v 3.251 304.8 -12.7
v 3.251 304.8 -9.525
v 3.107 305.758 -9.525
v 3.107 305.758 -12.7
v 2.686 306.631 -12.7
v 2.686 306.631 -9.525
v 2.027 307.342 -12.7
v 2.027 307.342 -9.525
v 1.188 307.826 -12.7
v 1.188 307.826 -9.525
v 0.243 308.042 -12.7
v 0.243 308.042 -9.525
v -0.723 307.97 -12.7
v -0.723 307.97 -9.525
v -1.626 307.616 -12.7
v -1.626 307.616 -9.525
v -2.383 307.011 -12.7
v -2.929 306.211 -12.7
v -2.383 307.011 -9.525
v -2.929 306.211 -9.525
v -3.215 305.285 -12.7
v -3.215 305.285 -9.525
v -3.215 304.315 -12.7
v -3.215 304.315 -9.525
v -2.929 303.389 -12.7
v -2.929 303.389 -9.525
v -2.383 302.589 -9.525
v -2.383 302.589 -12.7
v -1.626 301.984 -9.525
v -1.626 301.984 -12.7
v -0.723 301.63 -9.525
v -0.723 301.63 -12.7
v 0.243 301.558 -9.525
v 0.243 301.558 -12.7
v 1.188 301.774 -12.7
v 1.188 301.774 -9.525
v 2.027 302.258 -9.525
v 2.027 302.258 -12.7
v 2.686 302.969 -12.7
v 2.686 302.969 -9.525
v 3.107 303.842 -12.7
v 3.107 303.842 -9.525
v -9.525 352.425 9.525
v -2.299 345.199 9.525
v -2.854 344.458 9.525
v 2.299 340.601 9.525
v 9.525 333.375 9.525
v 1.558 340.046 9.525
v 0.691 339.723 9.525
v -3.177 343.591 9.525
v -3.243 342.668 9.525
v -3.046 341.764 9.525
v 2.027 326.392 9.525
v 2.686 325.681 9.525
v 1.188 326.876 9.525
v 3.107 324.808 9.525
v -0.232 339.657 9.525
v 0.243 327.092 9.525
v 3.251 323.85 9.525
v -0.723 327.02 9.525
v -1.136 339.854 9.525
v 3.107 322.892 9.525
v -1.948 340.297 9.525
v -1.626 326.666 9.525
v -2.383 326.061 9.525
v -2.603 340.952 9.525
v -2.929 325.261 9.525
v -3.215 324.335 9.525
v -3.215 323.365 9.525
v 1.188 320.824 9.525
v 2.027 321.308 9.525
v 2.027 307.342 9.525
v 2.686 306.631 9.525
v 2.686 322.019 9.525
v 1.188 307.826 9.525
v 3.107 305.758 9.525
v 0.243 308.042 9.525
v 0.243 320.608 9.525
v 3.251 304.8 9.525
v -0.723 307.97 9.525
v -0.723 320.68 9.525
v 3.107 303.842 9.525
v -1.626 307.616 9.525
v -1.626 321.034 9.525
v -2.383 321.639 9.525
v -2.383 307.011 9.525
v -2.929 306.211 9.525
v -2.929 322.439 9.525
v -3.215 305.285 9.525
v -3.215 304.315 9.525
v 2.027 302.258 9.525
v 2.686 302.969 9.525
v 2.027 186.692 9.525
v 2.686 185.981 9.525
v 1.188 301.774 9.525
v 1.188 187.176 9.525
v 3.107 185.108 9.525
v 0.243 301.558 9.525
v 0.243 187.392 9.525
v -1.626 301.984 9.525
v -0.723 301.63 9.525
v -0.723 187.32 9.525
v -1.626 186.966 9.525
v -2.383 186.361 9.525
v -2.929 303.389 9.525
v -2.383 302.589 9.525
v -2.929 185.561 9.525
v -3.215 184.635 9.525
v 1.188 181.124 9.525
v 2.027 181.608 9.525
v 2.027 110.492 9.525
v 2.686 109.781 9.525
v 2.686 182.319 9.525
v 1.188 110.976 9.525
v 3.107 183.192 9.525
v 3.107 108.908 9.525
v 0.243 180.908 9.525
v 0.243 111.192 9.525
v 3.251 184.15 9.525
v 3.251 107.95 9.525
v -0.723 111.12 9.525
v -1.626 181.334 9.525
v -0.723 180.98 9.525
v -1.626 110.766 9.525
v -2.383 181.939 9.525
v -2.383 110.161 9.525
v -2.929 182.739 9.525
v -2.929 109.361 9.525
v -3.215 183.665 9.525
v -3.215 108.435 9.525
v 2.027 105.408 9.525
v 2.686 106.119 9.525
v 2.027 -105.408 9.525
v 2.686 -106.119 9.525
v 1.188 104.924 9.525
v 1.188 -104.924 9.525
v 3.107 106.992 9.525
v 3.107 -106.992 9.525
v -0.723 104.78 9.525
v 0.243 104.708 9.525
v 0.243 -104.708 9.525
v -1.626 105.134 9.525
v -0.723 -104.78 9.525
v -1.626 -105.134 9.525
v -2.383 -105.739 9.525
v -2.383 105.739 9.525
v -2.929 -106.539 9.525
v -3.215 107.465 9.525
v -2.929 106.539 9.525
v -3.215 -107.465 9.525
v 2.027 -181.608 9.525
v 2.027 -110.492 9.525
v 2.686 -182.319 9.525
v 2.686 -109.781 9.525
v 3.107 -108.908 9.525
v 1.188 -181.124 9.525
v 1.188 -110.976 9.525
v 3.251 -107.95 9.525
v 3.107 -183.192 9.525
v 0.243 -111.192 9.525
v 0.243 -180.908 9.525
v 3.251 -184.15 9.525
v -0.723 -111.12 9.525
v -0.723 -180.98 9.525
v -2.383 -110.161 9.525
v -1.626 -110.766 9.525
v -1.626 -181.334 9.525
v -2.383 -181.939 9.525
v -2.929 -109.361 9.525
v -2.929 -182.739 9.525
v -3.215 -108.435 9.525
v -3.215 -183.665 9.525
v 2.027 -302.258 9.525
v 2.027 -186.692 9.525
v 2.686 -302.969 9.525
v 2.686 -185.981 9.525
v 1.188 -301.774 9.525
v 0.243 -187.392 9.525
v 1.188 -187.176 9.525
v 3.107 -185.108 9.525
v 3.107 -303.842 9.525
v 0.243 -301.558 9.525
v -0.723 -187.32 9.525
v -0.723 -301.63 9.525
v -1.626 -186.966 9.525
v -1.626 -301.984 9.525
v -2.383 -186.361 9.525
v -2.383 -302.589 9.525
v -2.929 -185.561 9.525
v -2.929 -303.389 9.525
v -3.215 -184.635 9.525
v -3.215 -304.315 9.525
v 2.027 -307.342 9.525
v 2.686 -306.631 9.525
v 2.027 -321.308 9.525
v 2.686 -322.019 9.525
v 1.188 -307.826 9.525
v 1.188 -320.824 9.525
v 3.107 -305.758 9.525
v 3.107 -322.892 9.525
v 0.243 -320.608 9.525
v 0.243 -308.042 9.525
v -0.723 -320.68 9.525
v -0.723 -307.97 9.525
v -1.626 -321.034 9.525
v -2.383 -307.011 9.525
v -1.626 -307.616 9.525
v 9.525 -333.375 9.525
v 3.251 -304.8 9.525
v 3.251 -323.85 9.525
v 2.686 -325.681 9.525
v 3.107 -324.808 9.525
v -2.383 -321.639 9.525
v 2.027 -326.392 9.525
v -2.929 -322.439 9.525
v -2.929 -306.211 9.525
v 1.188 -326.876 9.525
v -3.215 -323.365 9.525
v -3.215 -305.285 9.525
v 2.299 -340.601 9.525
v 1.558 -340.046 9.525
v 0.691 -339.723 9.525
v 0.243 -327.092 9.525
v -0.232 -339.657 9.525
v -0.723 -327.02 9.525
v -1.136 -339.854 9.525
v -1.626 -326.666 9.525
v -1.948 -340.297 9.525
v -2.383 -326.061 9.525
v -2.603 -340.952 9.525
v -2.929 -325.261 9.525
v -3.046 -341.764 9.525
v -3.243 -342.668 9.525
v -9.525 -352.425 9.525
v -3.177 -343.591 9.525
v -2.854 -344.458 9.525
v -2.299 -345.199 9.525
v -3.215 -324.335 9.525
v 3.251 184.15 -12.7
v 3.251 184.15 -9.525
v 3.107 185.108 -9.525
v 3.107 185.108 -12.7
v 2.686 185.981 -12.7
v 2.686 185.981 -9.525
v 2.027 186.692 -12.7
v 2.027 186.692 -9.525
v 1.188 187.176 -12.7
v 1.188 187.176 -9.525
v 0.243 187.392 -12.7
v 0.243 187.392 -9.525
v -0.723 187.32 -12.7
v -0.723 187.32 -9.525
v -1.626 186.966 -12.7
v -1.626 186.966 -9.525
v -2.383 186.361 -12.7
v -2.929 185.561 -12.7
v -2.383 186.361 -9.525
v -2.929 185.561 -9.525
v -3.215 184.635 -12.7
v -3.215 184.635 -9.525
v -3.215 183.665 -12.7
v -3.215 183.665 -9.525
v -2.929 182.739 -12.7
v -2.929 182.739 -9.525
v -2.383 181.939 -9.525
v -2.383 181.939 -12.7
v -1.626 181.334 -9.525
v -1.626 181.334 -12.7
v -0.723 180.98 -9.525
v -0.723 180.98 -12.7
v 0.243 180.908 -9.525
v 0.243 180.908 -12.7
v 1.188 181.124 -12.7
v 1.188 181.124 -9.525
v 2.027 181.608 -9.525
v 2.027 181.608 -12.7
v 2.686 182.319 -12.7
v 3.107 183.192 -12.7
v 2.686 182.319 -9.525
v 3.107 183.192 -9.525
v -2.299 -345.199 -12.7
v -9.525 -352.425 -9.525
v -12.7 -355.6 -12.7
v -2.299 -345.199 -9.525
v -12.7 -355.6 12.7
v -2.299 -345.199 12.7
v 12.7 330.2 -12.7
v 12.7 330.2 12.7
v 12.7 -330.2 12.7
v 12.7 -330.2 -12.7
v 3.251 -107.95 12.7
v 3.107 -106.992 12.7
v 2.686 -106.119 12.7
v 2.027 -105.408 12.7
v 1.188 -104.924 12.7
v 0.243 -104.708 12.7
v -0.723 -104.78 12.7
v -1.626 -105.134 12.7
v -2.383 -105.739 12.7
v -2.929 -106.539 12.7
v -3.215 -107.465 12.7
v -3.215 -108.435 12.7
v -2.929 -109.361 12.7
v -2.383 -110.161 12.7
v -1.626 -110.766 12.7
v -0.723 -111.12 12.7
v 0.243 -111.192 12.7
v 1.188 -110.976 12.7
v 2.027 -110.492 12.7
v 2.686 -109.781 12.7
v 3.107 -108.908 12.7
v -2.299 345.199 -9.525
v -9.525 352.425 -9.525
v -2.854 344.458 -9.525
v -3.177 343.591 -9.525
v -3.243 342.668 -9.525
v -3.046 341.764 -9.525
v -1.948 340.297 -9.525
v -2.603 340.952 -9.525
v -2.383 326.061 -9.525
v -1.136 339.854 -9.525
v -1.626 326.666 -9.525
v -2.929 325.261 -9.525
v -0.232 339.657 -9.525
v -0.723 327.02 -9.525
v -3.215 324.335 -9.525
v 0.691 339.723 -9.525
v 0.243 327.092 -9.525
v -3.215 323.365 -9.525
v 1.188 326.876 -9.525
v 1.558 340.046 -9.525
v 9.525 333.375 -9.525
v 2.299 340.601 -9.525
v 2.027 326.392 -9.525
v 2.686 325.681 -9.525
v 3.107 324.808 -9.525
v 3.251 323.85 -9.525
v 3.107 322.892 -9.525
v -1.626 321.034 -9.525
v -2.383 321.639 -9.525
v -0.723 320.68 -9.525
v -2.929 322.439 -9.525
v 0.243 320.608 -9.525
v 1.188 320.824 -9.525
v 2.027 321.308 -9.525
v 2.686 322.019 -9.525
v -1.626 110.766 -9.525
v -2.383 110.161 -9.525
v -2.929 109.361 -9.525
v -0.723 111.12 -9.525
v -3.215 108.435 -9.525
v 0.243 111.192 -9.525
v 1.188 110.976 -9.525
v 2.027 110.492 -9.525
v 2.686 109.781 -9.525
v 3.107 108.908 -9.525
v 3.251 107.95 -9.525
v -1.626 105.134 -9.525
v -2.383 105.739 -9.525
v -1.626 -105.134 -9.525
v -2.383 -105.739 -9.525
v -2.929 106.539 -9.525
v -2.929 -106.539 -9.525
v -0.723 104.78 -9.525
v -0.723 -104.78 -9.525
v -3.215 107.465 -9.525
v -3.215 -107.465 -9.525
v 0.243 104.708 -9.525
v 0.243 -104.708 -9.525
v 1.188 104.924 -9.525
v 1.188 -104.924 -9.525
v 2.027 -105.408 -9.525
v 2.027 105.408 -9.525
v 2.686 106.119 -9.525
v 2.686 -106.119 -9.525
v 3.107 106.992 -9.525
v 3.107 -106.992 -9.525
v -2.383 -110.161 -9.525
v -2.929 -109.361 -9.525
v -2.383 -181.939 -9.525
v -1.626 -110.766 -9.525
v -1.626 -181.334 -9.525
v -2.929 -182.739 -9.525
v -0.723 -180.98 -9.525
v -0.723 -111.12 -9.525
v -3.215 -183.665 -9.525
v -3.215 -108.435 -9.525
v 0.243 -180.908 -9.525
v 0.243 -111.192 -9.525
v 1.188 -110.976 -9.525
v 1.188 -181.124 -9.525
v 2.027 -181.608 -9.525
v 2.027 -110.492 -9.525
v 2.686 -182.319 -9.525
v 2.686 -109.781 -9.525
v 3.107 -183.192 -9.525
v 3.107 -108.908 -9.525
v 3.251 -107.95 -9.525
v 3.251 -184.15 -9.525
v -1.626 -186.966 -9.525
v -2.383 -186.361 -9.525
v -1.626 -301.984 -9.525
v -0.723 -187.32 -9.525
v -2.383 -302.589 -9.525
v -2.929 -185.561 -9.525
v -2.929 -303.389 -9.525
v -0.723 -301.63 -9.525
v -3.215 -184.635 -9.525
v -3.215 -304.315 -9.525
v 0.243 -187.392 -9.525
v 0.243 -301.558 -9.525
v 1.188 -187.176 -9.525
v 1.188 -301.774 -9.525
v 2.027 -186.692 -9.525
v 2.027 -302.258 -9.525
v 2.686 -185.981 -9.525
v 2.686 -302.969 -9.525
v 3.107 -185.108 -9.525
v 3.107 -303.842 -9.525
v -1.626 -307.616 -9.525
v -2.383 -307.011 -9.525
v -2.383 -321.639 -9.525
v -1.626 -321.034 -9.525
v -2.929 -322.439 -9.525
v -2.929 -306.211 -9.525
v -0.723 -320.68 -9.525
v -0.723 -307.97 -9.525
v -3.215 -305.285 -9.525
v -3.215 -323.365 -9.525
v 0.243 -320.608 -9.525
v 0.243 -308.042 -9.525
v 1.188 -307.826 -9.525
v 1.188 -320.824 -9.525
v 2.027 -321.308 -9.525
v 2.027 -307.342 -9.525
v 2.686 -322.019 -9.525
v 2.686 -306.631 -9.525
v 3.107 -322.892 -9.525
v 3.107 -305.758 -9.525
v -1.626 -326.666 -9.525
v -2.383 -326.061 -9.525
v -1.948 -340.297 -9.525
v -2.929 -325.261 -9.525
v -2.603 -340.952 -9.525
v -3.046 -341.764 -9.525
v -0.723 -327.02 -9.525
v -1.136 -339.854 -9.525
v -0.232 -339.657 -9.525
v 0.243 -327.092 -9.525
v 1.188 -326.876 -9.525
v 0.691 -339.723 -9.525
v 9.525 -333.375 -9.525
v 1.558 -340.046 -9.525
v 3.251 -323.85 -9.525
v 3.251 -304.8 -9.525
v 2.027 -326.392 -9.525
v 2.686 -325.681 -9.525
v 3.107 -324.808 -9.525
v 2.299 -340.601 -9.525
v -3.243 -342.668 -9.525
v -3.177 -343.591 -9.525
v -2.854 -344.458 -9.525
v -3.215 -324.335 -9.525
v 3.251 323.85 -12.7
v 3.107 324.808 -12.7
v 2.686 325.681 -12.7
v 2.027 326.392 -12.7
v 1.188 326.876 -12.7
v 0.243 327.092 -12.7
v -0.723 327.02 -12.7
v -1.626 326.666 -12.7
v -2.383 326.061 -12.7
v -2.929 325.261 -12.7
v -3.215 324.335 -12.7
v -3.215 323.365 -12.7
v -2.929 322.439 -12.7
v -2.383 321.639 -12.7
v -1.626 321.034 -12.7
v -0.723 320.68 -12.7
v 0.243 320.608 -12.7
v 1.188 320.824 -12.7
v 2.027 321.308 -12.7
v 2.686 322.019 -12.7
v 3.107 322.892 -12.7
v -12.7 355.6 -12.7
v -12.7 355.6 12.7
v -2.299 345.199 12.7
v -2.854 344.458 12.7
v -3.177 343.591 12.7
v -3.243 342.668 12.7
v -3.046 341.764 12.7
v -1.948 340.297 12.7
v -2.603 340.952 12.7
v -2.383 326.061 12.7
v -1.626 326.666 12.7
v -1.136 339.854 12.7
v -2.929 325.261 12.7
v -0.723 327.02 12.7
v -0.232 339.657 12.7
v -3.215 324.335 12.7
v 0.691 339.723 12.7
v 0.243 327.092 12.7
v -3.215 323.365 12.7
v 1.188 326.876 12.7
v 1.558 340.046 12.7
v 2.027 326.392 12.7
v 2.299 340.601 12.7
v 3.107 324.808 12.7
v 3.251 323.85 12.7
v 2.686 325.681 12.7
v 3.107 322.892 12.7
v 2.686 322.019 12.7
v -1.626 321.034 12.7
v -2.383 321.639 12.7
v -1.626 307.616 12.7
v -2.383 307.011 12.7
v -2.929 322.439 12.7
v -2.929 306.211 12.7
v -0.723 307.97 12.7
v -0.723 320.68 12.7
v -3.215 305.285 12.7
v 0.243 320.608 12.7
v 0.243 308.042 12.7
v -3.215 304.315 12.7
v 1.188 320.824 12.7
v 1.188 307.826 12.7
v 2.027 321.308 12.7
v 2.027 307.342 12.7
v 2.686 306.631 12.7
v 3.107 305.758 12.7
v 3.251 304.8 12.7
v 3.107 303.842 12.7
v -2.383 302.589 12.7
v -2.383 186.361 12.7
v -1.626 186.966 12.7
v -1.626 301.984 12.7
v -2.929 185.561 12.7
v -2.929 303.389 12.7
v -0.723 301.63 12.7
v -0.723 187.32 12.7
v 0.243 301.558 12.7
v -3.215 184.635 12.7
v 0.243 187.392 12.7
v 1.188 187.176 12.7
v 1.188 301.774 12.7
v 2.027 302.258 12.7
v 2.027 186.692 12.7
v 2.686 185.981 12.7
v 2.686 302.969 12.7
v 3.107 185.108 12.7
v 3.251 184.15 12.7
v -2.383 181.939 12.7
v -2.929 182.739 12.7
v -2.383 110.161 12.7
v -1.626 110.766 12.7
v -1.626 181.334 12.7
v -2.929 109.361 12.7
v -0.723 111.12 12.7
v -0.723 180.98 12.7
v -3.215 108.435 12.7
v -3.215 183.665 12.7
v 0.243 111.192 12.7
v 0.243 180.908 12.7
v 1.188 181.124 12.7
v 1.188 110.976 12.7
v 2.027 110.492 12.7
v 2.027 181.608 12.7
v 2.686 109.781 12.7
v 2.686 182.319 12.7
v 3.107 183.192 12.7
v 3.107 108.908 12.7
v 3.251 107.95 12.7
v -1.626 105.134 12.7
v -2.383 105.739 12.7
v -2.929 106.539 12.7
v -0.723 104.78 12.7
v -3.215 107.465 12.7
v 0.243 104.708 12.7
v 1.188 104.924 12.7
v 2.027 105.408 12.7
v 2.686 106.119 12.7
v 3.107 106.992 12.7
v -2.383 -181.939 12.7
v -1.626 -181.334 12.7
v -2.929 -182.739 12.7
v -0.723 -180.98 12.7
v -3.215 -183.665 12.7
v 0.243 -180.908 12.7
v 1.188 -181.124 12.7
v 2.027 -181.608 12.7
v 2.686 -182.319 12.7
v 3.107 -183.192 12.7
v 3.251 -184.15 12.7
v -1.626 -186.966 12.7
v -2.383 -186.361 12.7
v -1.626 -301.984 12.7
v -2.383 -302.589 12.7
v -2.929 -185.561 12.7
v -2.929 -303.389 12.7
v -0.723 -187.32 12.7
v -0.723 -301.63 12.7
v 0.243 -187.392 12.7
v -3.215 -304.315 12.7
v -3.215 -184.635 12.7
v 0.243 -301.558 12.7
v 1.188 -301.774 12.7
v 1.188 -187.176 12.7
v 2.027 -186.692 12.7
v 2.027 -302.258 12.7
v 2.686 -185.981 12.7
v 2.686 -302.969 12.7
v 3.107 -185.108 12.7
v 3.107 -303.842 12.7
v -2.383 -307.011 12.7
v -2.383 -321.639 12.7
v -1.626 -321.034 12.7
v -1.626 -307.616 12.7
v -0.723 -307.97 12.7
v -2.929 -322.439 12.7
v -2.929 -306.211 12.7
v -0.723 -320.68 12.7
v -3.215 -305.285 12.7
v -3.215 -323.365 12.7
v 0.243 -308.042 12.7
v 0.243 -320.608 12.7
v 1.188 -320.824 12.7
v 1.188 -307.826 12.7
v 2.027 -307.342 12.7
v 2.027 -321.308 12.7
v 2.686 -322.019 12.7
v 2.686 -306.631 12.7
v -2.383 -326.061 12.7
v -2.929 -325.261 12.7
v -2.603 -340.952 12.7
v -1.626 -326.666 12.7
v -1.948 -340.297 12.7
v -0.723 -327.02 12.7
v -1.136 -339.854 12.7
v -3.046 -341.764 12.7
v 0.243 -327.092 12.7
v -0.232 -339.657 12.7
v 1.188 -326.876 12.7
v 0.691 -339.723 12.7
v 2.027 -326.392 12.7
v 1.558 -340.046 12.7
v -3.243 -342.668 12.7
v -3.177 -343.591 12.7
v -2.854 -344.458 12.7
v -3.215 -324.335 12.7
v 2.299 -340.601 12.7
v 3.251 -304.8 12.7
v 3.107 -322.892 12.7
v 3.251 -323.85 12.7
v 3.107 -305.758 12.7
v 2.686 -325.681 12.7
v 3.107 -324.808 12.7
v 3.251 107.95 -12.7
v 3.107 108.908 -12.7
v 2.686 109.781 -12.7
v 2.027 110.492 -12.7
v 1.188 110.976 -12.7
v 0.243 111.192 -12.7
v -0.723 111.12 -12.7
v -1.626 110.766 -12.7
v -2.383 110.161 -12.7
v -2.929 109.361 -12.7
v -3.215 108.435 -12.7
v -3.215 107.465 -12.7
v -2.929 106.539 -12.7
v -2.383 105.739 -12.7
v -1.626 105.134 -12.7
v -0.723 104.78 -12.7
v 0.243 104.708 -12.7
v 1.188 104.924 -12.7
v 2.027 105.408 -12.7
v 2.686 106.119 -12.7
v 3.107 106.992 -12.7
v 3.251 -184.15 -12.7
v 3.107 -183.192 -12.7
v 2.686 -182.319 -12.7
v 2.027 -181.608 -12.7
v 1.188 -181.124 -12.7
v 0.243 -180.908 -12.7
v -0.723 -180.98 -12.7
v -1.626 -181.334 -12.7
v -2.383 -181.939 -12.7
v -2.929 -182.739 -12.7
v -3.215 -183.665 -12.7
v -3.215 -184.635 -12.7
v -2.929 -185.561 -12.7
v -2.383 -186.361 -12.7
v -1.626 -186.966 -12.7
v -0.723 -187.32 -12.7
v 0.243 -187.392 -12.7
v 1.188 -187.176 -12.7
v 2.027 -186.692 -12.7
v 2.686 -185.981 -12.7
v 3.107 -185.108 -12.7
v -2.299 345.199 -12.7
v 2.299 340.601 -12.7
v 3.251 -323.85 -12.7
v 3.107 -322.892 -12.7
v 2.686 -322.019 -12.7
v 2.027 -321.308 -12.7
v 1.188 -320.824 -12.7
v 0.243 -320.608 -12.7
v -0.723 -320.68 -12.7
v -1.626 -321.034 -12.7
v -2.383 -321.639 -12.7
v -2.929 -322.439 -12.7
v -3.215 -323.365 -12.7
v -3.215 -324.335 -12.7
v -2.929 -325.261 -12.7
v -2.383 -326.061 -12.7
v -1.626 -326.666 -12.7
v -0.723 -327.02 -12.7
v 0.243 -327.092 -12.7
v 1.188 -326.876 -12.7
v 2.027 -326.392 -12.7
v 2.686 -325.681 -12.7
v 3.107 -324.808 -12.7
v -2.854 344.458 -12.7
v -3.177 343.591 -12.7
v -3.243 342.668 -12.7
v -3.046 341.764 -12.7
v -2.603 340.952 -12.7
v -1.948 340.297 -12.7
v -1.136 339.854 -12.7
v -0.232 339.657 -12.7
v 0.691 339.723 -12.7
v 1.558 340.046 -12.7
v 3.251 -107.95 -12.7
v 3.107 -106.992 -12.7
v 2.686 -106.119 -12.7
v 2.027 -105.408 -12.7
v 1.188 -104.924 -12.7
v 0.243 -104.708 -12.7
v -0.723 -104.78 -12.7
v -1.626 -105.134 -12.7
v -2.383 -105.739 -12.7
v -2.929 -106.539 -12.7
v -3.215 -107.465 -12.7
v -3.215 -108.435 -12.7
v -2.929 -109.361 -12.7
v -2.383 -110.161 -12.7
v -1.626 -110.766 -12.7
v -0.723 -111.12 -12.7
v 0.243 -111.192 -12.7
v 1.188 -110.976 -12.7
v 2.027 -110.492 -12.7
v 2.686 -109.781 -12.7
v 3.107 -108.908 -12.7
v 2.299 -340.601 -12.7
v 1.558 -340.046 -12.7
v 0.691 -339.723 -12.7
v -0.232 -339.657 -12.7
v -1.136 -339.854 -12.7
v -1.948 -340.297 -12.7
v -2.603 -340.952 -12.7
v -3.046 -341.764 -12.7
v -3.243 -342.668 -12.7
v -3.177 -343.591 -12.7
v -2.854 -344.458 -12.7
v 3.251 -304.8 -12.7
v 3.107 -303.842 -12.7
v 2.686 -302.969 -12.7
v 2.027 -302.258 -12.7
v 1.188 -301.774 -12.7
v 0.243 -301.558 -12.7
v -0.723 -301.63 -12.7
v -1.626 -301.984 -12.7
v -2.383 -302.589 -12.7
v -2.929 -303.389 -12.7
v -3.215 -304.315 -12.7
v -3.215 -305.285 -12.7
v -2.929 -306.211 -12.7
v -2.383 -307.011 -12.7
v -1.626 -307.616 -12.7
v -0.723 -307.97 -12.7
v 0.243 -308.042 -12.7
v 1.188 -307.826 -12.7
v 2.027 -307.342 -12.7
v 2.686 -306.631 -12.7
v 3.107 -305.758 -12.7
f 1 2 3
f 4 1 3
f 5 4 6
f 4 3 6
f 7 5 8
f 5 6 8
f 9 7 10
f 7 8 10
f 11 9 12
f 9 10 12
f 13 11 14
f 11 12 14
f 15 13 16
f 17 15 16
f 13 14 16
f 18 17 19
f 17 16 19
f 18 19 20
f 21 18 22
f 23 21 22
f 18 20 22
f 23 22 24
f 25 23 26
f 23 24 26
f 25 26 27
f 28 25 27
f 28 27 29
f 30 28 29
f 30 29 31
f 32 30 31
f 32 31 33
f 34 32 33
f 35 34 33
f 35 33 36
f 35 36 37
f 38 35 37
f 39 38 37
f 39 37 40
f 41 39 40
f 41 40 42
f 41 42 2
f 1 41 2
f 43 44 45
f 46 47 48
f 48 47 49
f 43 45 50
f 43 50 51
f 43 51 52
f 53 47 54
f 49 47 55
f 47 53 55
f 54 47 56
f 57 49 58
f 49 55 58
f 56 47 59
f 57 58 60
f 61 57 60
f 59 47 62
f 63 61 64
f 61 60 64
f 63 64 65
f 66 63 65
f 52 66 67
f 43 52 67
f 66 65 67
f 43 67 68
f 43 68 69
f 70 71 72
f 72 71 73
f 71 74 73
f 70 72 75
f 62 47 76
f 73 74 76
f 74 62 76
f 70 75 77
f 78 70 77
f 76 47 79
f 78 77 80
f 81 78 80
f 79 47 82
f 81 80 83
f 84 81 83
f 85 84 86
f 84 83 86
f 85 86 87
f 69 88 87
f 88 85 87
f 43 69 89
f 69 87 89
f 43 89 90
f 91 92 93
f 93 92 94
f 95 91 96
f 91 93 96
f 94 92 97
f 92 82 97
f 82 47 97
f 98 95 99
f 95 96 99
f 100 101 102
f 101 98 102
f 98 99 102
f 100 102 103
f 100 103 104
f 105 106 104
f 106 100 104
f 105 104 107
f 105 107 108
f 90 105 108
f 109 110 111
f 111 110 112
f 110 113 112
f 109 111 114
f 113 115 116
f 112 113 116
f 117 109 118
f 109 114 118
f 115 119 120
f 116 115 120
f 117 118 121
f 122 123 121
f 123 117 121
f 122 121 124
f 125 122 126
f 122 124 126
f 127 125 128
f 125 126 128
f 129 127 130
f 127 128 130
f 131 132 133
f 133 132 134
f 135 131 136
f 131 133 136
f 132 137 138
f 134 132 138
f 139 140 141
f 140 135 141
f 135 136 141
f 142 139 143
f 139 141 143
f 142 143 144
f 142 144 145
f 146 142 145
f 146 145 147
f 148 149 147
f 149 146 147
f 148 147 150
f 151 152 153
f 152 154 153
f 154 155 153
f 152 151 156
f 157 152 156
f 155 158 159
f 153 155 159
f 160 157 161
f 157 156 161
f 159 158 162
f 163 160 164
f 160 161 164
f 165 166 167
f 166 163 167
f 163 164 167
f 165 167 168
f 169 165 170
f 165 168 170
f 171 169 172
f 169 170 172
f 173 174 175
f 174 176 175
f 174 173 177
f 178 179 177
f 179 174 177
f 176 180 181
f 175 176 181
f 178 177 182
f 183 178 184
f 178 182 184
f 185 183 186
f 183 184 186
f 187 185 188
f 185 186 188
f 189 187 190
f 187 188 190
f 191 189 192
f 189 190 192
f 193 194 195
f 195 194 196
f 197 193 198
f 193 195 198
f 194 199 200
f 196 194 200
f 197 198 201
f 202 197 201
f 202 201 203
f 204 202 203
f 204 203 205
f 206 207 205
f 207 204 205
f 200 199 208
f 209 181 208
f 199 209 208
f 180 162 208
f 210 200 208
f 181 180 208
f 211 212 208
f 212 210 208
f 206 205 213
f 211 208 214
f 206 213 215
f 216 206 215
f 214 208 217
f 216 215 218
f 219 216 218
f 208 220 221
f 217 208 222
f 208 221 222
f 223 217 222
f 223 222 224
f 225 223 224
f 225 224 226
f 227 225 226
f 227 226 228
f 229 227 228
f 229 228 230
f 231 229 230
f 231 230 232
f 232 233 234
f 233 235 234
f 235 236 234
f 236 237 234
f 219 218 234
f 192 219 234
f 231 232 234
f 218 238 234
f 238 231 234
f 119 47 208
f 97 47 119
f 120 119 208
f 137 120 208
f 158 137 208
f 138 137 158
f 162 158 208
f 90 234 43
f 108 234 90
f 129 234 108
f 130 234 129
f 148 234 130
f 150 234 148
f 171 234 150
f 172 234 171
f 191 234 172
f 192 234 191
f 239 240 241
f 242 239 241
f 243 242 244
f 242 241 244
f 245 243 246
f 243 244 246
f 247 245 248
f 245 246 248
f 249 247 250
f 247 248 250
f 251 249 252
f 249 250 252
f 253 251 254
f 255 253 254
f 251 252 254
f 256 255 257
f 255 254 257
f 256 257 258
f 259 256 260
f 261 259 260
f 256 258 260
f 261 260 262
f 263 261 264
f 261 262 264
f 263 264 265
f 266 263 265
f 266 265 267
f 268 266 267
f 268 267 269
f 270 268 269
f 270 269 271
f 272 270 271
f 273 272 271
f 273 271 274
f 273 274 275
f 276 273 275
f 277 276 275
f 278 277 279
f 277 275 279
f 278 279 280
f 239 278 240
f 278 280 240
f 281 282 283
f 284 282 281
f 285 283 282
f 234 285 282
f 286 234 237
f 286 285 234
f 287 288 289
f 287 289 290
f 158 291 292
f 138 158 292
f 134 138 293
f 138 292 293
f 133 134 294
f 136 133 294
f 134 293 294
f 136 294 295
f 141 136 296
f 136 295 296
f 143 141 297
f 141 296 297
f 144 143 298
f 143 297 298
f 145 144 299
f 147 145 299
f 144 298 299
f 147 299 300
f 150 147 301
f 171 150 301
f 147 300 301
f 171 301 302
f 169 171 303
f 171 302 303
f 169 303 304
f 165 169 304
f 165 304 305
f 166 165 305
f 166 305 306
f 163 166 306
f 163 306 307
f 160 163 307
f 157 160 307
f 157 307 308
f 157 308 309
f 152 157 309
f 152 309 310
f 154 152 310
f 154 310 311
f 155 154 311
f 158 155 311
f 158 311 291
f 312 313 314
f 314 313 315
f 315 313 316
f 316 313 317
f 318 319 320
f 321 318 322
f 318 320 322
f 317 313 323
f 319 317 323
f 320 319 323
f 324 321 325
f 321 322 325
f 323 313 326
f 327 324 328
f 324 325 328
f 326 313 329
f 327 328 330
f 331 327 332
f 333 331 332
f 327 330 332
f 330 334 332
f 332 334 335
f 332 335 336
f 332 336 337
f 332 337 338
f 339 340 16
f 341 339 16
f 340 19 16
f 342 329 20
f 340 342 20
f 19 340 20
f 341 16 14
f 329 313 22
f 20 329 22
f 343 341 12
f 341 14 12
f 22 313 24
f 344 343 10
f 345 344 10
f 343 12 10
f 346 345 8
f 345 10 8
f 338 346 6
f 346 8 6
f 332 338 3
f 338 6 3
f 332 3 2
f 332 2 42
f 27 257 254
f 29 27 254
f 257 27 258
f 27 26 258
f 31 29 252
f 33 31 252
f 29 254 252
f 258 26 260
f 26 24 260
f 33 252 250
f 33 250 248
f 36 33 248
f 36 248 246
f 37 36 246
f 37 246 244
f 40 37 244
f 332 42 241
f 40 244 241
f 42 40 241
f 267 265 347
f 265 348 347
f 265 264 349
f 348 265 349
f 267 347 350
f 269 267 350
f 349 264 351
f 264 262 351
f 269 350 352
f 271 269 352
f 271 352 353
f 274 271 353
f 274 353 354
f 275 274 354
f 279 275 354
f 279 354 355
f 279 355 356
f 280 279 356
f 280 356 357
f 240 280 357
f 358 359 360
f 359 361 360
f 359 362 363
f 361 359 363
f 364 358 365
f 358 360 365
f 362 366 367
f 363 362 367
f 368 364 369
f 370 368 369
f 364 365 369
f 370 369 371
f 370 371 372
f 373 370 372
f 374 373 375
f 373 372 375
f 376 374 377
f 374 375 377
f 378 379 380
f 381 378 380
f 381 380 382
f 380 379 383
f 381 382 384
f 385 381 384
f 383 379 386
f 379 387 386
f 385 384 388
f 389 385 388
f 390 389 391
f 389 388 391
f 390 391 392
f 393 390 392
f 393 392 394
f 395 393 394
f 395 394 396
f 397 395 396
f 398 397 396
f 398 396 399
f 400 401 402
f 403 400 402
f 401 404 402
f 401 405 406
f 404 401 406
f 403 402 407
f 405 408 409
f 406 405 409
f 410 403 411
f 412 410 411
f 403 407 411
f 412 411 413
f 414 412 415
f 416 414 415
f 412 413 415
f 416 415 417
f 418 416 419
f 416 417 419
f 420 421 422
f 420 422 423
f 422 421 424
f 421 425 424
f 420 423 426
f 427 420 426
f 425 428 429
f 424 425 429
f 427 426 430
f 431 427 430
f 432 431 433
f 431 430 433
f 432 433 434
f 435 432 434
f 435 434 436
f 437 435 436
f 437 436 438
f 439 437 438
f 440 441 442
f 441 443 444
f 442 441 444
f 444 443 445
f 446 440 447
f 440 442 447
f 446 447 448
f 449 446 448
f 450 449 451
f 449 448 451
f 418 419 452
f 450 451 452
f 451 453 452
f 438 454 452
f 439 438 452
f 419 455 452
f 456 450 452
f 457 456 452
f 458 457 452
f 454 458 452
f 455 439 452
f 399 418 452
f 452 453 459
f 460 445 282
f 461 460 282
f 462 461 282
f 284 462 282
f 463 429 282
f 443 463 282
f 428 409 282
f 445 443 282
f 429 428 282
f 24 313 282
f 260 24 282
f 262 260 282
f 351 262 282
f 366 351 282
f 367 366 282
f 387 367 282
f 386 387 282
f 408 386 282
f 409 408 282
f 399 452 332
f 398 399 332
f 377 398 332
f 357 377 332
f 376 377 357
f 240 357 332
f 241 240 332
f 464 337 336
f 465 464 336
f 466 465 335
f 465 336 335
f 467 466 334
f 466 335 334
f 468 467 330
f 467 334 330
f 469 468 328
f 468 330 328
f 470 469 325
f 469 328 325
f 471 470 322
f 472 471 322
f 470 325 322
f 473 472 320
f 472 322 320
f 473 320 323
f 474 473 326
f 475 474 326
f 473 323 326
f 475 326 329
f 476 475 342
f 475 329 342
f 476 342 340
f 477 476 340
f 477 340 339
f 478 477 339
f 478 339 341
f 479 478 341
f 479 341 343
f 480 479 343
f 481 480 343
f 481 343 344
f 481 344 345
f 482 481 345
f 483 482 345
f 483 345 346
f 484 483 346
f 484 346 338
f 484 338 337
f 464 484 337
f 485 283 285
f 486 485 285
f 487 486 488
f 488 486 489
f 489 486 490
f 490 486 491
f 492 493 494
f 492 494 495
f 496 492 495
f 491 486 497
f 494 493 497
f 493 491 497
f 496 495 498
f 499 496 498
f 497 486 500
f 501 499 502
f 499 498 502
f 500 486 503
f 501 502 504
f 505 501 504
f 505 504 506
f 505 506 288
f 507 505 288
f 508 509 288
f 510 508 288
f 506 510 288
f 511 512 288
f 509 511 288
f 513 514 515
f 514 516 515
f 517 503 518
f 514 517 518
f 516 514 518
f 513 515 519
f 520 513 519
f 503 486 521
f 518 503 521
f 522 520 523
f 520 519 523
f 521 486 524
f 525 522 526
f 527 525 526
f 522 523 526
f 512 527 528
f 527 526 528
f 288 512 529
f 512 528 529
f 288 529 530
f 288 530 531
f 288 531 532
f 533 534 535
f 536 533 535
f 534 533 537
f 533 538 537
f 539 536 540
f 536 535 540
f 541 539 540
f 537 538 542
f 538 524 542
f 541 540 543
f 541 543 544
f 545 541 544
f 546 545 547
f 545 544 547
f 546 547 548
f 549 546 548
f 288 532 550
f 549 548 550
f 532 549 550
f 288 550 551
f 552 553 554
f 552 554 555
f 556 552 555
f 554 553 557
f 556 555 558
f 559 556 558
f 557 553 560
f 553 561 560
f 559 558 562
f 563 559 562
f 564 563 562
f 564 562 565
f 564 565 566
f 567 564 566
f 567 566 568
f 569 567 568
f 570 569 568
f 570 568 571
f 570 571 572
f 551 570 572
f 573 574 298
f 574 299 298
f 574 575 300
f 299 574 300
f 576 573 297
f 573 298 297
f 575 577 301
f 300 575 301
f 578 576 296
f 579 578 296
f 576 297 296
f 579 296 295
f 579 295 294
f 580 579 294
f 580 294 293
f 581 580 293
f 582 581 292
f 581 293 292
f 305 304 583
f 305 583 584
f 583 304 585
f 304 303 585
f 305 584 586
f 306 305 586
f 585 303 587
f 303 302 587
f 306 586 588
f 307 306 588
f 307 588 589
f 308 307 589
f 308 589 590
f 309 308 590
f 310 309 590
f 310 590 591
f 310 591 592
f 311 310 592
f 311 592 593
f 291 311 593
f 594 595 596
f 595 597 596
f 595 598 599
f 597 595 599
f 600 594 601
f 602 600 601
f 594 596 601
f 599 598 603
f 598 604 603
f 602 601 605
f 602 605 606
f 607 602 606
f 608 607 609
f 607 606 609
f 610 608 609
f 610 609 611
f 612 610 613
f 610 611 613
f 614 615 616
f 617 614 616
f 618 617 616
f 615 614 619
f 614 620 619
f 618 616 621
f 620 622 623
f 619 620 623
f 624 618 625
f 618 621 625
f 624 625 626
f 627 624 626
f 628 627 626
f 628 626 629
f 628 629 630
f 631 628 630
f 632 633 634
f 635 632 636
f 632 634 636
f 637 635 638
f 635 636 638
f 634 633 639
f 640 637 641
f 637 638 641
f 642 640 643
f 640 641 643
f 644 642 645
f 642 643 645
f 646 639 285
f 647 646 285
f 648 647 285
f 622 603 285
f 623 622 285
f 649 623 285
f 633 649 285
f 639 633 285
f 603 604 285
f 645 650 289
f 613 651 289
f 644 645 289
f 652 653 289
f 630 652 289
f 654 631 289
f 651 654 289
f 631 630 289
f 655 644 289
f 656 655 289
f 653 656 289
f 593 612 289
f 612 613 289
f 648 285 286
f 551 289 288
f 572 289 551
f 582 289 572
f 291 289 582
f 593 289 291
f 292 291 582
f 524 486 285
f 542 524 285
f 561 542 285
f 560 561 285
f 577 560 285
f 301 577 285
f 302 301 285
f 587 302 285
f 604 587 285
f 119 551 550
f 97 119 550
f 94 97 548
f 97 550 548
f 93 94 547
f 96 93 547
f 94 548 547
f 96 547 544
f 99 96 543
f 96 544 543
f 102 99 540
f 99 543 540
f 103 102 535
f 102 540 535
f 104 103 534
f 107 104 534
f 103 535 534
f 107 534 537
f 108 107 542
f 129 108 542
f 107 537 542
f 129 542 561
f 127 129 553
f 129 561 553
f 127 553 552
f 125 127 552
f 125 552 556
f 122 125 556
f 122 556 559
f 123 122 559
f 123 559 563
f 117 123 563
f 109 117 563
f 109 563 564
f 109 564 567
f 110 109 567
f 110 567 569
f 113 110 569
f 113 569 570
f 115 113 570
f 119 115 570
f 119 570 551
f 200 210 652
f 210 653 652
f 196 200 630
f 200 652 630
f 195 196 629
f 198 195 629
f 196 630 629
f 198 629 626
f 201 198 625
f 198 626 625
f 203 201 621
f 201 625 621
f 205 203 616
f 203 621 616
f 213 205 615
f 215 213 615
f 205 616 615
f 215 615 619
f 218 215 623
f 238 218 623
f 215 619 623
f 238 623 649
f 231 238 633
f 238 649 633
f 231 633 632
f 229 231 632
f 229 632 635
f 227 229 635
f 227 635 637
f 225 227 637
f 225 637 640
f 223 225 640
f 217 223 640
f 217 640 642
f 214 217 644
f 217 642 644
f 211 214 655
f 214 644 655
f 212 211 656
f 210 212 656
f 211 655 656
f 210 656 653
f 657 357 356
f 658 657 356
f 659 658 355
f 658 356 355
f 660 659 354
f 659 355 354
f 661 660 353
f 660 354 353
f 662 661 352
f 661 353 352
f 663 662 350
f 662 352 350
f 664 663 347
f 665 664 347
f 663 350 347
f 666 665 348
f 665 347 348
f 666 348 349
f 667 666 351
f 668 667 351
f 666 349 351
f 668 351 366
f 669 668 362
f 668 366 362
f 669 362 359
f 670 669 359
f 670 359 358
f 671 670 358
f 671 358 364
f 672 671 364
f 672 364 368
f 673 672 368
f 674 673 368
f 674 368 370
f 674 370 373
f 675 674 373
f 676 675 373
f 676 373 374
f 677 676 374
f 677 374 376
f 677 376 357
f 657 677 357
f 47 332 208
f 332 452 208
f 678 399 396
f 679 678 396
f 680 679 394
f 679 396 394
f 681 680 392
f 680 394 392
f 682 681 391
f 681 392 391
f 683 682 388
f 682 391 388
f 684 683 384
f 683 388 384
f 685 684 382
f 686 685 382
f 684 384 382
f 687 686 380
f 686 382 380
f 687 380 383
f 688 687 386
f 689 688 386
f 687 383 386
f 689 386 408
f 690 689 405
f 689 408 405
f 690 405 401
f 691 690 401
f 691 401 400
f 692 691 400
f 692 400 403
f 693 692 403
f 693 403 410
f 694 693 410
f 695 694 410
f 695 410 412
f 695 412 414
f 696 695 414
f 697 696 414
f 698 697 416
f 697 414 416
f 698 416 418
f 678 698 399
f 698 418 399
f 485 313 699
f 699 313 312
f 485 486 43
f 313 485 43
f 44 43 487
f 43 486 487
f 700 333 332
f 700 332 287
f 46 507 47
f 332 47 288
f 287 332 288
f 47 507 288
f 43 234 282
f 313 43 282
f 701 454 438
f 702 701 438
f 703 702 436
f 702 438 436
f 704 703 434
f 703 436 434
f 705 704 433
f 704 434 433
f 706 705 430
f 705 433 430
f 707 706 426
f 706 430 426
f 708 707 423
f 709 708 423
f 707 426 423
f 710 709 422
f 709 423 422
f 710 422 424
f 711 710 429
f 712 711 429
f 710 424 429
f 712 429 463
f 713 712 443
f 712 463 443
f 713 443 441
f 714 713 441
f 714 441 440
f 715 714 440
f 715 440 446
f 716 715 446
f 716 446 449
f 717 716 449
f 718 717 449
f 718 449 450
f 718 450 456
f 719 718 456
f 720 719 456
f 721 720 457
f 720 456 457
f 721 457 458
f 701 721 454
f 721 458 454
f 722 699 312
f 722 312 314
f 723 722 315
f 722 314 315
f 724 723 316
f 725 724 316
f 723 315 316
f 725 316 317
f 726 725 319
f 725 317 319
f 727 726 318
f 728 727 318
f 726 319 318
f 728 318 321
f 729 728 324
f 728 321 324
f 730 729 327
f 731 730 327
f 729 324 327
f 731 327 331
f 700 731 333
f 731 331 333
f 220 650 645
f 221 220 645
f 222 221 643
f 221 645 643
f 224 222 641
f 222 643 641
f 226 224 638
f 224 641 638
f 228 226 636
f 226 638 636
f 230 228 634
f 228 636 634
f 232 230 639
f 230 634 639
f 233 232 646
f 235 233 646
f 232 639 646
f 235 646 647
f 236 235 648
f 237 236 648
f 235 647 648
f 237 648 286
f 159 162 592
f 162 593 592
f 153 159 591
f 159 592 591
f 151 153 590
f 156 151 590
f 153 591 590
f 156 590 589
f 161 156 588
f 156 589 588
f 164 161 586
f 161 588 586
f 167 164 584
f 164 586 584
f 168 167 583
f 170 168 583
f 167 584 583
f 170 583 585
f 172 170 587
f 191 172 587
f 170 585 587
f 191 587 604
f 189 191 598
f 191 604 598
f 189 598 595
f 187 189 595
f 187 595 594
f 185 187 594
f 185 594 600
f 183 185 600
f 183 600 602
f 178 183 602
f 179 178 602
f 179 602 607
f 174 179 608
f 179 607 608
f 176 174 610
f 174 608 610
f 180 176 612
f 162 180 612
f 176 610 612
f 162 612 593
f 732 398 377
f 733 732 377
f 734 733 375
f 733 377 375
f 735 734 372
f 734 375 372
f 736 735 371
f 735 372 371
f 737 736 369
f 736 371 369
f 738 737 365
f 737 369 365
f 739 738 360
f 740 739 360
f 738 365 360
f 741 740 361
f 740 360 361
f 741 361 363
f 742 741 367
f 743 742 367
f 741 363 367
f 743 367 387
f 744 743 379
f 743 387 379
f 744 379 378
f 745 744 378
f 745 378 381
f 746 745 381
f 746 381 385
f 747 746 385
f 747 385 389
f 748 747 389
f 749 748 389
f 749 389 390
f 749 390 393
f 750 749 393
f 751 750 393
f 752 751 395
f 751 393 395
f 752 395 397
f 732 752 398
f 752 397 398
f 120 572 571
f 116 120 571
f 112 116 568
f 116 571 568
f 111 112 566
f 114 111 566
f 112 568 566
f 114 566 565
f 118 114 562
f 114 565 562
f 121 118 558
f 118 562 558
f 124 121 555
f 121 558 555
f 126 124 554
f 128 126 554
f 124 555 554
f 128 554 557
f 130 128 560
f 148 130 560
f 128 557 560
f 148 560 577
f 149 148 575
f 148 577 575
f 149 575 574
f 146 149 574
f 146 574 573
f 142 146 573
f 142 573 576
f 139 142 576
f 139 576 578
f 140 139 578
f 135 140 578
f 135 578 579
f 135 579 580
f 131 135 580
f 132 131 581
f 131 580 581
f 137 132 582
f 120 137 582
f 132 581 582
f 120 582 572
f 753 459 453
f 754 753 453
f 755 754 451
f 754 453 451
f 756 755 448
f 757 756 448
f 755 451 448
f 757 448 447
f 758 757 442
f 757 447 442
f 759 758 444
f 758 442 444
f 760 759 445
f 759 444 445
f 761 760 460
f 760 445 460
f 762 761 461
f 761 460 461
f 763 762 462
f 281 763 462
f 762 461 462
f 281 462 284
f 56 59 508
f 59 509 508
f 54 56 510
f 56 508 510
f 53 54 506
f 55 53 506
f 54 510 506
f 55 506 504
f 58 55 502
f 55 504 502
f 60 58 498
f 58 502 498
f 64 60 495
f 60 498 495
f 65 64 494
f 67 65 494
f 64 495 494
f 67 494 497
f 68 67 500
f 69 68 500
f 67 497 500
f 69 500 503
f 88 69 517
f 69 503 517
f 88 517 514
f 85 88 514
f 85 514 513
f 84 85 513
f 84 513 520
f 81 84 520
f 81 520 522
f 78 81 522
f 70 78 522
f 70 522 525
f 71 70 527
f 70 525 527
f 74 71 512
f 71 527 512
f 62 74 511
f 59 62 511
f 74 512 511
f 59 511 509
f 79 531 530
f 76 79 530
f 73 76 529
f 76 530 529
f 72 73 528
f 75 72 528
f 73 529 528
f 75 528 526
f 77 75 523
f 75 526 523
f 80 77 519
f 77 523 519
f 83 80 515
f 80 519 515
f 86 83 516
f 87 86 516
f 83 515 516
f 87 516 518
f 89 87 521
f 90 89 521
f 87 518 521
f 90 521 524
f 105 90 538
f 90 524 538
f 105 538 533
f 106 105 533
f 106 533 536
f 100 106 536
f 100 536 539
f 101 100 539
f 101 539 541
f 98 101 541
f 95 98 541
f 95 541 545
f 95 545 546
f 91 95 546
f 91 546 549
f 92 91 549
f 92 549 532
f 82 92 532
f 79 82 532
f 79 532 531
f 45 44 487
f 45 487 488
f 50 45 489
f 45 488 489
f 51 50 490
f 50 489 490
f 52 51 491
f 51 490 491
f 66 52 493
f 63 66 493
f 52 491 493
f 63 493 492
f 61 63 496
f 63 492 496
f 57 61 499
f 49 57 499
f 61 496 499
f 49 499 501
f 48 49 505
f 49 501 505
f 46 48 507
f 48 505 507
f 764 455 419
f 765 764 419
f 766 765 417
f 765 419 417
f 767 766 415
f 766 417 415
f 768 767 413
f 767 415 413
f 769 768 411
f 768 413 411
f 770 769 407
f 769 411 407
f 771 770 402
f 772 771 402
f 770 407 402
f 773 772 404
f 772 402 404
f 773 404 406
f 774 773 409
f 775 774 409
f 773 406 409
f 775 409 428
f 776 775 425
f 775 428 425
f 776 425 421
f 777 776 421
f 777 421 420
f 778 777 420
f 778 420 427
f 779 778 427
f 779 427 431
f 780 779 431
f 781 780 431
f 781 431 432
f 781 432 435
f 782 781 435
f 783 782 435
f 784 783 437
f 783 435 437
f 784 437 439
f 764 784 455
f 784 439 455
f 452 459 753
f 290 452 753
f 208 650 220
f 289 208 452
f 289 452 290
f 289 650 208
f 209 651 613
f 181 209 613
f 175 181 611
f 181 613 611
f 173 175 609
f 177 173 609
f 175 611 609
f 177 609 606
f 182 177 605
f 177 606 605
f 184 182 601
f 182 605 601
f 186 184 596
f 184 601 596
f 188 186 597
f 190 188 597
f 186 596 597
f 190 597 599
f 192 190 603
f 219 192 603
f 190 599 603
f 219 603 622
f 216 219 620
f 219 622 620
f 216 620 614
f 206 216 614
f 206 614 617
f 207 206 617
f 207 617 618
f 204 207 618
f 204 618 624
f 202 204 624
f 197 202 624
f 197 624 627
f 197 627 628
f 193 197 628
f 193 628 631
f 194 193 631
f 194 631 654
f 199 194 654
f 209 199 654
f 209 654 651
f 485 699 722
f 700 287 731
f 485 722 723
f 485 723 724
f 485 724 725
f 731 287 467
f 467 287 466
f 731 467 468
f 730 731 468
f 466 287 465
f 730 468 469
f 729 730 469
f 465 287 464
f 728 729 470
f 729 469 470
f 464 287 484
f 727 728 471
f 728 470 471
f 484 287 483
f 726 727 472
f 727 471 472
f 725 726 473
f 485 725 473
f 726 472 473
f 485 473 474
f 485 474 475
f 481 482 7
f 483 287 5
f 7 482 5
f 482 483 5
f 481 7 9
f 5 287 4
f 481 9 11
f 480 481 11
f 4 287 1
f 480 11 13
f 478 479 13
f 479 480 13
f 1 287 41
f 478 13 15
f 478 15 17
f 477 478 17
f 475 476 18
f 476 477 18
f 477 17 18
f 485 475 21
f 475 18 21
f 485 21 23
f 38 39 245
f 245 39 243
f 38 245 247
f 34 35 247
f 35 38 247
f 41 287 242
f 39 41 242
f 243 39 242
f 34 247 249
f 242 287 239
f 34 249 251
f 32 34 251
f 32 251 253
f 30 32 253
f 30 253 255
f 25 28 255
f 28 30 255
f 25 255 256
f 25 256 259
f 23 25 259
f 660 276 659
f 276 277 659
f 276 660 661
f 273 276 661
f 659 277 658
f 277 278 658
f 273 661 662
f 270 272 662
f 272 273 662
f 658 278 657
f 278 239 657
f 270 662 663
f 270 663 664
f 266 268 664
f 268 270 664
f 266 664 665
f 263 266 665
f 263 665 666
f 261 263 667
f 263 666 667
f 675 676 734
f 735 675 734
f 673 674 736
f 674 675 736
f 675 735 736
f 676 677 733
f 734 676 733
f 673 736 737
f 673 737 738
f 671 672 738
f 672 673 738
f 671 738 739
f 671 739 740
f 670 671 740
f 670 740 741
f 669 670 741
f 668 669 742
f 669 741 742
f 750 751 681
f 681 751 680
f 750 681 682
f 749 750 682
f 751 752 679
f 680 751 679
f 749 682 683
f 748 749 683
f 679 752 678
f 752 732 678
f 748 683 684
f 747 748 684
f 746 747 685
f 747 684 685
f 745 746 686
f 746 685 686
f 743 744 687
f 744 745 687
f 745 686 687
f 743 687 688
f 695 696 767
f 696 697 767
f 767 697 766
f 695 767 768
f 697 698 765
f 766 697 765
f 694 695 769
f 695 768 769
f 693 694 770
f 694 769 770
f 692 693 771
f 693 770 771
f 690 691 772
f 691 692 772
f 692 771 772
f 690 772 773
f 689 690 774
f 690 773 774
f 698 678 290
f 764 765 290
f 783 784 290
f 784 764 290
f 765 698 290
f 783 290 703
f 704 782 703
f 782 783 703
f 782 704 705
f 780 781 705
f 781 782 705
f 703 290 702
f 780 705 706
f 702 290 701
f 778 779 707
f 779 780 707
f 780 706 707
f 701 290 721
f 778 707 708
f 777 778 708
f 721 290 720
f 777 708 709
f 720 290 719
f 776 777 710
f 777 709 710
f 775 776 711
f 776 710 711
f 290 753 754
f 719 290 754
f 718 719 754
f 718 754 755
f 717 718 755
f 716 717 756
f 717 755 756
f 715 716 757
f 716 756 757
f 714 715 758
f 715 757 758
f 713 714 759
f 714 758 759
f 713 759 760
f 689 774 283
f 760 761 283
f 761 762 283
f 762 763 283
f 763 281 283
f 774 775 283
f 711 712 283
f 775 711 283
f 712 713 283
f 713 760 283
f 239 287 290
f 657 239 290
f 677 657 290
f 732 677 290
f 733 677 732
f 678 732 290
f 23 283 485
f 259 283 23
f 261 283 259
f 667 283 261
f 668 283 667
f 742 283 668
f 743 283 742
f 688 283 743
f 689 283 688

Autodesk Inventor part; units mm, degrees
ref_plane "YZ Plane" through (0, 0, 0) normal (1, 0, 0) x (0, 1, 0)
ref_plane "XZ Plane" through (0, 0, 0) normal (0, 1, 0) x (-1, 0, 0)
ref_plane "XY Plane" through (0, 0, 0) normal (0, 0, 1) x (1, 0, 0)
sketch "Sketch1" plane through (0, 0, 0) normal (0, 1, 0) x (-1, 0, 0)
  line L0 (-12.7, -12.7) -> (12.7, -12.7)
  line L1 (12.7, -12.7) -> (12.7, 12.7)
  line L2 (12.7, 12.7) -> (-12.7, 12.7)
  line L3 (-12.7, 12.7) -> (-12.7, -12.7)
  line L4 (-12.7, -12.7) -> (12.7, 12.7) construction
  line L5 (12.7, -12.7) -> (-12.7, 12.7) construction
  line L6 (9.525, 9.525) -> (9.525, -9.525)
  line L7 (9.525, -9.525) -> (-9.525, -9.525)
  line L8 (-9.525, -9.525) -> (-9.525, 9.525)
  line L9 (-9.525, 9.525) -> (9.525, 9.525)
  point P0 (0, 0)
  dimension "d0" = 25.4
  dimension "d1" = 25.4
  dimension "d2" = 3.175
extrude "Extrusion1" add sketch "Sketch1" along normal mid plane 711.2
sketch "Sketch2" plane through (-12.7, 355.6, 12.7) normal (0, 0, 1) x (1, 0, 0)
  line L0 (0, 0) -> (25.4, 0) projected
  line L1 (0, 0) -> (25.4, -25.4)
  line L2 (25.4, -711.2) -> (25.4, 0) projected
  circle A0 centre (12.7, -31.75) radius 3.2512
  circle A1 centre (12.7, -50.8) radius 3.2512
  line L3 (0, -711.2) -> (0, 0) projected
  line L4 (0, -355.6) -> (25.4, -355.6) construction
  line L5 (0, -711.2) -> (25.4, -711.2)
  line L6 (0, -711.2) -> (25.4, -685.8)
  circle A2 centre (12.7, -679.45) radius 3.2512
  circle A3 centre (12.7, -660.4) radius 3.2512
  circle A4 centre (12.7, -12.7) radius 3.2512
  circle A5 centre (12.7, -698.5) radius 3.2512
  point P0 (12.7, -355.6)
  point P1 (12.7, 0)
  point P2 (12.7, -711.2)
  point P3 (14.9989, -14.9989)
  point P4 (10.4011, -10.4011)
  point P5 (14.9989, -696.2011)
  point P6 (10.4011, -700.7989)
  dimension "d5" = 25.4
  dimension "d6" = 6.5024
  dimension "d7" = 31.75
  dimension "d8" = 19.05
extrude "Extrusion2" cut sketch "Sketch2" against normal blind 711.2 contours L0 L2 L1 A4 | A4 L1 | L1 A4 | L6 A5 L2 L5 | A5 L6 | L6 A5 | A0 | A1 | A2 | A3
sketch "Sketch4" plane through (-12.7, -355.6, 12.7) normal (0, 0, 1) x (1, 0, 0)
  line L0 (0, 0) -> (0, 711.2) construction
  line L1 (0, 355.6) -> (25.4, 355.6) construction
  line L2 (25.4, 25.4) -> (25.4, 685.8) construction
  circle A0 centre (12.7, 171.45) radius 3.2512
  circle A1 centre (12.7, 539.75) radius 3.2512
  point P0 (12.7, 355.6)
  dimension "d23" = 6.5024
  dimension "d24" = 6.5024
  dimension "d25" = 184.15
extrude "Extrusion4" cut sketch "Sketch4" against normal blind 25.4
sketch "Sketch5" plane through (12.7, -330.2, -12.7) normal (1, 0, 0) x (0, 0, -1)
  line L0 (0, 685.8) -> (0, -25.4) projected
  line L1 (0, 330.2) -> (-25.4, 330.2)
  line L2 (-25.4, 0) -> (-25.4, 660.4) projected
  circle A0 centre (-12.7, 279.4) radius 3.2512
  circle A1 centre (-12.7, 381) radius 3.2512
  line L3 (-25.4, -25.4) -> (0, -25.4) projected
  point P0 (-12.7, 330.2)
  point P1 (-12.7, 330.2)
  dimension "d26" = 6.5024
  dimension "d27" = 304.8
extrude "Extrusion5" [suppressed]
sketch "Sketch9" plane through (-12.7, -355.6, 12.7) normal (0, 0, 1) x (1, 0, 0)
  line L0 (0, 0) -> (0, 711.2) projected
  line L1 (0, 355.6) -> (25.4, 355.6)
  line L2 (25.4, 25.4) -> (25.4, 685.8) construction
  line L3 (12.7, 247.65) -> (12.7, 463.55) construction
  circle A0 centre (12.7, 463.55) radius 3.2512
  circle A1 centre (12.7, 247.65) radius 3.2512
  point P0 (12.7, 355.6)
  point P1 (12.7, 355.6)
  dimension "d36" = 215.9
  dimension "d37" = 6.5024
extrude "Extrusion6" cut sketch "Sketch9" against normal blind 25.4
properties part number "STRU_003_BilletPole_28in_Angled_Unique" material "Aluminum 6061"
